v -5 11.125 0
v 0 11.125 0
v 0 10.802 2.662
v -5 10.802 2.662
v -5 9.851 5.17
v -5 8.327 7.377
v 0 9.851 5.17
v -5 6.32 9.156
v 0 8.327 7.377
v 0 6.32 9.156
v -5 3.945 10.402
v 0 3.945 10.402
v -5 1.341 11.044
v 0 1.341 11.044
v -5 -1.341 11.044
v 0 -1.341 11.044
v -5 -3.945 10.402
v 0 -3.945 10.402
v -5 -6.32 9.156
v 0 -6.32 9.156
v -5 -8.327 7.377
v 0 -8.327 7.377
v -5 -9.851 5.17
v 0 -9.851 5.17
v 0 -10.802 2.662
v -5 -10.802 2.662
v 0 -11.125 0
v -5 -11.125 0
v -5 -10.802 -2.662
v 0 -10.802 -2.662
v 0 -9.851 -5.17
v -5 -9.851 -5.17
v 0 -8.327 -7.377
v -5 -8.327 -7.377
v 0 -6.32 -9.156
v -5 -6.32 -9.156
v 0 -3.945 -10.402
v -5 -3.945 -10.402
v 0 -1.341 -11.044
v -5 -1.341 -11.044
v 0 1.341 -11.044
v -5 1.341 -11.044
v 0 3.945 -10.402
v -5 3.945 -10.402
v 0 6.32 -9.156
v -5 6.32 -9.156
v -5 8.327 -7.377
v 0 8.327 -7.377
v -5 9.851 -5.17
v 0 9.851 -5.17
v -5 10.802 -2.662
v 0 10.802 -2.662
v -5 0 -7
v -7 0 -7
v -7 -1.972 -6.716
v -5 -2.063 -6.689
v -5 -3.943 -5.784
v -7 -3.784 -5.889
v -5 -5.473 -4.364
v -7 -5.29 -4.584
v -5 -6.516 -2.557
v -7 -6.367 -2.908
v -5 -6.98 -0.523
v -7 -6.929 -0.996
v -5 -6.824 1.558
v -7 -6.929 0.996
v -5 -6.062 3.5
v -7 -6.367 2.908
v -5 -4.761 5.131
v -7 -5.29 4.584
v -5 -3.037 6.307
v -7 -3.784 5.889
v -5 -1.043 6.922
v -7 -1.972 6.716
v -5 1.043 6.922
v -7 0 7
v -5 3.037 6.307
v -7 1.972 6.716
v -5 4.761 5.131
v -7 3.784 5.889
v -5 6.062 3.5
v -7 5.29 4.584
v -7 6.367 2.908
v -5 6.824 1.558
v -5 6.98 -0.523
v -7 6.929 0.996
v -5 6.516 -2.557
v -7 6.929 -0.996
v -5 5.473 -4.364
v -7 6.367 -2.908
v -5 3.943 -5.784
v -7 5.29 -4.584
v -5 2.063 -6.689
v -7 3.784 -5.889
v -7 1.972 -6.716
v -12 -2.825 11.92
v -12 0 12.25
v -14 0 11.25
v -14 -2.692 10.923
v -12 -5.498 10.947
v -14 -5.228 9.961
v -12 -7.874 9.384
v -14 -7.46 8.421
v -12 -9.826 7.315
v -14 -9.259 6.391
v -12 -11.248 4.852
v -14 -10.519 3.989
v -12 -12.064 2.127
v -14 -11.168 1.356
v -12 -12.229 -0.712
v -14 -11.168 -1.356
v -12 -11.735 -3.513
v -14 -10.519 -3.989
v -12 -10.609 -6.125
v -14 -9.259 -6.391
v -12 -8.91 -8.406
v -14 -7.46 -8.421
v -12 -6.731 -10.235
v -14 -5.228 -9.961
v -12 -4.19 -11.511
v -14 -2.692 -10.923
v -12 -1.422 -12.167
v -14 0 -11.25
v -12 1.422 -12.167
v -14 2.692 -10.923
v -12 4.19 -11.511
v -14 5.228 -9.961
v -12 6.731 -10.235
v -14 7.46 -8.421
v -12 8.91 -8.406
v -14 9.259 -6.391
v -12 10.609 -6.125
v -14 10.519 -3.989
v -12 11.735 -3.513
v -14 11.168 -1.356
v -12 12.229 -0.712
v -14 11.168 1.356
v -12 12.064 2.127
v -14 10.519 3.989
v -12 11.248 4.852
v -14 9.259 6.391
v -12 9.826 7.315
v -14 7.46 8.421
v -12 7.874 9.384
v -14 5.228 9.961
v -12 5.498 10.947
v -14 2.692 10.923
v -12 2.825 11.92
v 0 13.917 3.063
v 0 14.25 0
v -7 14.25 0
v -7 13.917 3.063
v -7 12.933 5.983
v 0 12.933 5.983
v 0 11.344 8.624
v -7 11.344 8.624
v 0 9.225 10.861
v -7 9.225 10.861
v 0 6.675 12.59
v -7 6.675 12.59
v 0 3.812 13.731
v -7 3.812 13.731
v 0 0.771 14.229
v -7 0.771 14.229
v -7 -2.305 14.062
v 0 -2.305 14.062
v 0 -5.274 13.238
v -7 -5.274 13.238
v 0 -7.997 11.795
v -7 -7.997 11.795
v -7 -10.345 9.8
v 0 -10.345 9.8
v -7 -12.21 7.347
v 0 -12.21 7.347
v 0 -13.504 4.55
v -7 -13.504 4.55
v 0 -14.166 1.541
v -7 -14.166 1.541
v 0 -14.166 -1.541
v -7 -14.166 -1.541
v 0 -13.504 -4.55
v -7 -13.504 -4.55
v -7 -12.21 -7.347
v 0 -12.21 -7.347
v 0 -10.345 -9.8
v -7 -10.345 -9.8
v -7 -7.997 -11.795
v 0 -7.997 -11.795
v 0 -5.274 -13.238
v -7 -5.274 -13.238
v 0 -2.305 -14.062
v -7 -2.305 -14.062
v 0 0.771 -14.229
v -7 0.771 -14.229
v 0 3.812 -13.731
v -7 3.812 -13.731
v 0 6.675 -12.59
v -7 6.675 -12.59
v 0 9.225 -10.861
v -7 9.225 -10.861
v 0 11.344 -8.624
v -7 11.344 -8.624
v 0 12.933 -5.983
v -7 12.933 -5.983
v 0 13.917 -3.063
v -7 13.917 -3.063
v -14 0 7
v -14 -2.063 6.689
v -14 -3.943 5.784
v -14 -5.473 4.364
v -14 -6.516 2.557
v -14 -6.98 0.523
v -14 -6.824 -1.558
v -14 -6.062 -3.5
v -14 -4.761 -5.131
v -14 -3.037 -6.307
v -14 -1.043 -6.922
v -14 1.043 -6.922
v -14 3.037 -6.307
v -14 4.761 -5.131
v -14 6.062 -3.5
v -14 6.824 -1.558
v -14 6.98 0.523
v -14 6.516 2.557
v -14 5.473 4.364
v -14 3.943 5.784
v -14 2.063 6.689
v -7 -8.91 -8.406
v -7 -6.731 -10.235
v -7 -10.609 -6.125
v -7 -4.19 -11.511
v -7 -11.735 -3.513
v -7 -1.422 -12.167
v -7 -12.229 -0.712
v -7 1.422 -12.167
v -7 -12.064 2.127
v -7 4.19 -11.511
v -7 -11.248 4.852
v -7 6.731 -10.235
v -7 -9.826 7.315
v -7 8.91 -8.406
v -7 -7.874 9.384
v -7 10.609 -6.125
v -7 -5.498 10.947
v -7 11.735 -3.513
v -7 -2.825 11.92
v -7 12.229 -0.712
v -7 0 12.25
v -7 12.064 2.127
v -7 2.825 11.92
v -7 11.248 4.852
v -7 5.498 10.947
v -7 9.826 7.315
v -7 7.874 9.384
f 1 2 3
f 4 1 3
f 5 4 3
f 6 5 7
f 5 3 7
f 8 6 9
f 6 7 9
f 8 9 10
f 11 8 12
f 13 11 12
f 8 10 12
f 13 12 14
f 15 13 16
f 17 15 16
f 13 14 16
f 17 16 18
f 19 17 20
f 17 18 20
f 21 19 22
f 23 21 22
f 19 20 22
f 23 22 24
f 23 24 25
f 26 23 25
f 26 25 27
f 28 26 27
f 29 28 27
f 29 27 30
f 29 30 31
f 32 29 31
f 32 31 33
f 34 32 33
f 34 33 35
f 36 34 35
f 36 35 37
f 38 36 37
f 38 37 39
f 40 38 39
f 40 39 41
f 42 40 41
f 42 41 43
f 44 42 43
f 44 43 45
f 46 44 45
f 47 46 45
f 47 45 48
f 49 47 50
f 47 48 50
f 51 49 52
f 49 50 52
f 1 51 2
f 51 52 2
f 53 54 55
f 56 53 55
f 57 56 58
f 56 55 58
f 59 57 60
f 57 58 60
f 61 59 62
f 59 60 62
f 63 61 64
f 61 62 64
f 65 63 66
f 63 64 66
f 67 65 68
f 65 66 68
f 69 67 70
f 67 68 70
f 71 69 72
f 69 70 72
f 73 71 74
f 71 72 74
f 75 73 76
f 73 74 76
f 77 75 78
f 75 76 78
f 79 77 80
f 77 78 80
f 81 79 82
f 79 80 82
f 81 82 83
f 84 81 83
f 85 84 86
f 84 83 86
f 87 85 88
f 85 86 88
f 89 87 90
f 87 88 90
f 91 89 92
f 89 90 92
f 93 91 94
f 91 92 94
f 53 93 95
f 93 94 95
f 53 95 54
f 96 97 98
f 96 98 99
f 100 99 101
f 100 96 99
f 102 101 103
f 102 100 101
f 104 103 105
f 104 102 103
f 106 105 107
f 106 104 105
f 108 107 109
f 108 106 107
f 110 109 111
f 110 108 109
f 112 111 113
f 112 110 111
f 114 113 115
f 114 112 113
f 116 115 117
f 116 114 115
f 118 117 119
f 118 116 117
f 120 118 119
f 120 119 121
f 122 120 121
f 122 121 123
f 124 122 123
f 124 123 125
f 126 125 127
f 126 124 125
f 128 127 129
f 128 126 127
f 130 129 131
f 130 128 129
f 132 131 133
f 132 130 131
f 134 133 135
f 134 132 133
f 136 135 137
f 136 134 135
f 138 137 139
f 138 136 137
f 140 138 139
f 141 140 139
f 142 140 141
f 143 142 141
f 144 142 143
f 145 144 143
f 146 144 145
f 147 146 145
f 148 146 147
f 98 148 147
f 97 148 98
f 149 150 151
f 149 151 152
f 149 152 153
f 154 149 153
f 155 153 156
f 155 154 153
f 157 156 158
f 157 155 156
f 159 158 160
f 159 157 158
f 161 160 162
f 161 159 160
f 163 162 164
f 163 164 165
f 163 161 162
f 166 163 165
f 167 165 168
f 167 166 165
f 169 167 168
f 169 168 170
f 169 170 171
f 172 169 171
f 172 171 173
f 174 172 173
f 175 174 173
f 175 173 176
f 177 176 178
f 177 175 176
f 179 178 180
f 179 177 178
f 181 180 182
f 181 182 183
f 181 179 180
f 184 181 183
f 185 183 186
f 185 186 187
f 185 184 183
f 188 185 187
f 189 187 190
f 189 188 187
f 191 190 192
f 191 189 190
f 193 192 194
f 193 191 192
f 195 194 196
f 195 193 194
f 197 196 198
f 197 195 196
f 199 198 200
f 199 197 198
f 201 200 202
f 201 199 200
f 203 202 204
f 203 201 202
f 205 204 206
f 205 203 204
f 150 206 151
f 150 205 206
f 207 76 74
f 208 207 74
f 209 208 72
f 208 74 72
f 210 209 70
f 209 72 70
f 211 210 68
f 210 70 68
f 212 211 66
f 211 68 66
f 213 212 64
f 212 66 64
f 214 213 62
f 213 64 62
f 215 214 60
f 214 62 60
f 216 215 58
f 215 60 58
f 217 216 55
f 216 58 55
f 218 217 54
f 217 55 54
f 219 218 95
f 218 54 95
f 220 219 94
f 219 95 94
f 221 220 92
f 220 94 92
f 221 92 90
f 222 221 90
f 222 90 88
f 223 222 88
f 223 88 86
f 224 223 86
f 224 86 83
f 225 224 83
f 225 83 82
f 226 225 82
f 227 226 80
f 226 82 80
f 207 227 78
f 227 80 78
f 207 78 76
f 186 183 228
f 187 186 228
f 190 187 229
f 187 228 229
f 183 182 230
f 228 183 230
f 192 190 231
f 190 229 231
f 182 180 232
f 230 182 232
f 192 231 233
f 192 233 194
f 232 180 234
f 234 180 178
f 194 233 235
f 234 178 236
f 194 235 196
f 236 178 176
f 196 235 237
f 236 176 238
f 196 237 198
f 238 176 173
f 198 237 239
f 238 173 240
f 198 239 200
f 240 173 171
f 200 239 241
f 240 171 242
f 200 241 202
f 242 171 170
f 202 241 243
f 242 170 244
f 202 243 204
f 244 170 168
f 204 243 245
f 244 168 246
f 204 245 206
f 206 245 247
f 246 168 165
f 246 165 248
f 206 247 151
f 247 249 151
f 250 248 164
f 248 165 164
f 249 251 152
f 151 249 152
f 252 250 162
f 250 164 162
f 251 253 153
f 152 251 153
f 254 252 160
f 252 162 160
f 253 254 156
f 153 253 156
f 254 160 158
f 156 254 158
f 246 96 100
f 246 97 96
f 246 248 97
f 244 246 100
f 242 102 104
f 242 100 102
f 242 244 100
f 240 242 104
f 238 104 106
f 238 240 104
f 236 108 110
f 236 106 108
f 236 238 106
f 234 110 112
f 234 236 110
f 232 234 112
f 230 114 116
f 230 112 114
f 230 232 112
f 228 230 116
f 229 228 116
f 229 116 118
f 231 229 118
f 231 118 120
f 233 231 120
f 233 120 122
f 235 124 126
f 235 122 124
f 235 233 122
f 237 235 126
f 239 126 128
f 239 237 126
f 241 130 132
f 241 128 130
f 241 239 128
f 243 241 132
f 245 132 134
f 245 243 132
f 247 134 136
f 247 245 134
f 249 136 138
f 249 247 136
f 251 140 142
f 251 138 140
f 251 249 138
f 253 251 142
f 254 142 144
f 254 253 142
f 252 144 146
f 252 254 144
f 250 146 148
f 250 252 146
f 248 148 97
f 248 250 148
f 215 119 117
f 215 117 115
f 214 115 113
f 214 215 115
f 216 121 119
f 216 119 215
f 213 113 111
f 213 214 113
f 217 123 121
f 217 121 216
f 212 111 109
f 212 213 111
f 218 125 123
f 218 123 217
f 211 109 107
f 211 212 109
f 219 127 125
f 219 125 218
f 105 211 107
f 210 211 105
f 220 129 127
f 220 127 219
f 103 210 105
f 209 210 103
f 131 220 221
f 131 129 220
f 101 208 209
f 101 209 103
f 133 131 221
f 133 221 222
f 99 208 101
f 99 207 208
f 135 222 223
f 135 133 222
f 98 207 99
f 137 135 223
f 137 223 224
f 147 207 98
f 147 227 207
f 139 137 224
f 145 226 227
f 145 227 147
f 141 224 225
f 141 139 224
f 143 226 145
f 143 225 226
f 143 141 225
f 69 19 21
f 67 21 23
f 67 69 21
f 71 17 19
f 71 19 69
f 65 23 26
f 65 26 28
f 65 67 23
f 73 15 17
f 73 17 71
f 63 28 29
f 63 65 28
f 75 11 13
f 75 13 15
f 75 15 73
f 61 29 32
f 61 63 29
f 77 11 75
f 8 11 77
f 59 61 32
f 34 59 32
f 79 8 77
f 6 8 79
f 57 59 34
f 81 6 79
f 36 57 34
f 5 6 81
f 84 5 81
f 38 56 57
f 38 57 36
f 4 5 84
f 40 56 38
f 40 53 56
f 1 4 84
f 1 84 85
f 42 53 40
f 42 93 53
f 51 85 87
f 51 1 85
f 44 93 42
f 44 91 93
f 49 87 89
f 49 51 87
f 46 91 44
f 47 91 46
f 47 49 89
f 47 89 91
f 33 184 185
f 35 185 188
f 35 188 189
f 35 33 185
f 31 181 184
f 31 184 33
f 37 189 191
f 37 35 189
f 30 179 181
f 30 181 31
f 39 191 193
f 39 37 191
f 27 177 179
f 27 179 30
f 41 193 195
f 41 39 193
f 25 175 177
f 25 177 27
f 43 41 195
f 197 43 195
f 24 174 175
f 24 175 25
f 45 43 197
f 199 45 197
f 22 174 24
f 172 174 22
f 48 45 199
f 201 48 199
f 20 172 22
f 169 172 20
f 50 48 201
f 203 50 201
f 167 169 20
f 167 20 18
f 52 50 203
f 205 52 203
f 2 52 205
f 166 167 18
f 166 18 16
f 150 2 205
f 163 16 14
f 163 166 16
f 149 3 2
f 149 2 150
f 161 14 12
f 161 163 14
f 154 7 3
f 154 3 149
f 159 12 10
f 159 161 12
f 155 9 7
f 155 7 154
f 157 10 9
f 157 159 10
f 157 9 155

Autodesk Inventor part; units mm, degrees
ref_plane "YZ Plane" through (0, 0, 0) normal (1, 0, 0) x (0, 1, 0)
ref_plane "XZ Plane" through (0, 0, 0) normal (0, 1, 0) x (-1, 0, 0)
ref_plane "XY Plane" through (0, 0, 0) normal (0, 0, 1) x (1, 0, 0)
sketch "Sketch1" plane through (0, 0, 0) normal (1, 0, 0) x (0, 1, 0)
  circle A0 centre (0, 0) radius 11.125
  circle A1 centre (0, 0) radius 14.25
  dimension "d0" = 22.25
  dimension "d1" = 28.5
extrude "Extrusion1" add sketch "Sketch1" against normal blind 7
sketch "Sketch2" plane through (-7, 0, 0) normal (-1, 0, 0) x (0, 0, 1)
  circle A0 centre (0, 0) radius 14.25 projected
  circle A1 centre (0, 0) radius 11.125 projected
  circle A2 centre (0, 0) radius 12.25
  circle A3 centre (0, 0) radius 14.25 projected
  circle A4 centre (0, 0) radius 7
  dimension "d4" = 24.5
  dimension "d5" = 14
extrude "Extrusion2" add sketch "Sketch2" along normal blind 7 contours A1 | A2
sketch "Sketch3" plane through (-7, 0, 0) normal (1, 0, 0) x (0, 0, -1)
  circle A0 centre (0, 0) radius 7 projected
  circle A1 centre (0, 0) radius 11.125 projected
extrude "Extrusion3" add sketch "Sketch3" along normal blind 2
chamfer "Chamfer1" distance 1 distance2 2 1 edges at (-14, 0, -12.25) measured on face at (-14, -0.9772, 10.3813)
properties part number "am3298_bearing_adapter"
